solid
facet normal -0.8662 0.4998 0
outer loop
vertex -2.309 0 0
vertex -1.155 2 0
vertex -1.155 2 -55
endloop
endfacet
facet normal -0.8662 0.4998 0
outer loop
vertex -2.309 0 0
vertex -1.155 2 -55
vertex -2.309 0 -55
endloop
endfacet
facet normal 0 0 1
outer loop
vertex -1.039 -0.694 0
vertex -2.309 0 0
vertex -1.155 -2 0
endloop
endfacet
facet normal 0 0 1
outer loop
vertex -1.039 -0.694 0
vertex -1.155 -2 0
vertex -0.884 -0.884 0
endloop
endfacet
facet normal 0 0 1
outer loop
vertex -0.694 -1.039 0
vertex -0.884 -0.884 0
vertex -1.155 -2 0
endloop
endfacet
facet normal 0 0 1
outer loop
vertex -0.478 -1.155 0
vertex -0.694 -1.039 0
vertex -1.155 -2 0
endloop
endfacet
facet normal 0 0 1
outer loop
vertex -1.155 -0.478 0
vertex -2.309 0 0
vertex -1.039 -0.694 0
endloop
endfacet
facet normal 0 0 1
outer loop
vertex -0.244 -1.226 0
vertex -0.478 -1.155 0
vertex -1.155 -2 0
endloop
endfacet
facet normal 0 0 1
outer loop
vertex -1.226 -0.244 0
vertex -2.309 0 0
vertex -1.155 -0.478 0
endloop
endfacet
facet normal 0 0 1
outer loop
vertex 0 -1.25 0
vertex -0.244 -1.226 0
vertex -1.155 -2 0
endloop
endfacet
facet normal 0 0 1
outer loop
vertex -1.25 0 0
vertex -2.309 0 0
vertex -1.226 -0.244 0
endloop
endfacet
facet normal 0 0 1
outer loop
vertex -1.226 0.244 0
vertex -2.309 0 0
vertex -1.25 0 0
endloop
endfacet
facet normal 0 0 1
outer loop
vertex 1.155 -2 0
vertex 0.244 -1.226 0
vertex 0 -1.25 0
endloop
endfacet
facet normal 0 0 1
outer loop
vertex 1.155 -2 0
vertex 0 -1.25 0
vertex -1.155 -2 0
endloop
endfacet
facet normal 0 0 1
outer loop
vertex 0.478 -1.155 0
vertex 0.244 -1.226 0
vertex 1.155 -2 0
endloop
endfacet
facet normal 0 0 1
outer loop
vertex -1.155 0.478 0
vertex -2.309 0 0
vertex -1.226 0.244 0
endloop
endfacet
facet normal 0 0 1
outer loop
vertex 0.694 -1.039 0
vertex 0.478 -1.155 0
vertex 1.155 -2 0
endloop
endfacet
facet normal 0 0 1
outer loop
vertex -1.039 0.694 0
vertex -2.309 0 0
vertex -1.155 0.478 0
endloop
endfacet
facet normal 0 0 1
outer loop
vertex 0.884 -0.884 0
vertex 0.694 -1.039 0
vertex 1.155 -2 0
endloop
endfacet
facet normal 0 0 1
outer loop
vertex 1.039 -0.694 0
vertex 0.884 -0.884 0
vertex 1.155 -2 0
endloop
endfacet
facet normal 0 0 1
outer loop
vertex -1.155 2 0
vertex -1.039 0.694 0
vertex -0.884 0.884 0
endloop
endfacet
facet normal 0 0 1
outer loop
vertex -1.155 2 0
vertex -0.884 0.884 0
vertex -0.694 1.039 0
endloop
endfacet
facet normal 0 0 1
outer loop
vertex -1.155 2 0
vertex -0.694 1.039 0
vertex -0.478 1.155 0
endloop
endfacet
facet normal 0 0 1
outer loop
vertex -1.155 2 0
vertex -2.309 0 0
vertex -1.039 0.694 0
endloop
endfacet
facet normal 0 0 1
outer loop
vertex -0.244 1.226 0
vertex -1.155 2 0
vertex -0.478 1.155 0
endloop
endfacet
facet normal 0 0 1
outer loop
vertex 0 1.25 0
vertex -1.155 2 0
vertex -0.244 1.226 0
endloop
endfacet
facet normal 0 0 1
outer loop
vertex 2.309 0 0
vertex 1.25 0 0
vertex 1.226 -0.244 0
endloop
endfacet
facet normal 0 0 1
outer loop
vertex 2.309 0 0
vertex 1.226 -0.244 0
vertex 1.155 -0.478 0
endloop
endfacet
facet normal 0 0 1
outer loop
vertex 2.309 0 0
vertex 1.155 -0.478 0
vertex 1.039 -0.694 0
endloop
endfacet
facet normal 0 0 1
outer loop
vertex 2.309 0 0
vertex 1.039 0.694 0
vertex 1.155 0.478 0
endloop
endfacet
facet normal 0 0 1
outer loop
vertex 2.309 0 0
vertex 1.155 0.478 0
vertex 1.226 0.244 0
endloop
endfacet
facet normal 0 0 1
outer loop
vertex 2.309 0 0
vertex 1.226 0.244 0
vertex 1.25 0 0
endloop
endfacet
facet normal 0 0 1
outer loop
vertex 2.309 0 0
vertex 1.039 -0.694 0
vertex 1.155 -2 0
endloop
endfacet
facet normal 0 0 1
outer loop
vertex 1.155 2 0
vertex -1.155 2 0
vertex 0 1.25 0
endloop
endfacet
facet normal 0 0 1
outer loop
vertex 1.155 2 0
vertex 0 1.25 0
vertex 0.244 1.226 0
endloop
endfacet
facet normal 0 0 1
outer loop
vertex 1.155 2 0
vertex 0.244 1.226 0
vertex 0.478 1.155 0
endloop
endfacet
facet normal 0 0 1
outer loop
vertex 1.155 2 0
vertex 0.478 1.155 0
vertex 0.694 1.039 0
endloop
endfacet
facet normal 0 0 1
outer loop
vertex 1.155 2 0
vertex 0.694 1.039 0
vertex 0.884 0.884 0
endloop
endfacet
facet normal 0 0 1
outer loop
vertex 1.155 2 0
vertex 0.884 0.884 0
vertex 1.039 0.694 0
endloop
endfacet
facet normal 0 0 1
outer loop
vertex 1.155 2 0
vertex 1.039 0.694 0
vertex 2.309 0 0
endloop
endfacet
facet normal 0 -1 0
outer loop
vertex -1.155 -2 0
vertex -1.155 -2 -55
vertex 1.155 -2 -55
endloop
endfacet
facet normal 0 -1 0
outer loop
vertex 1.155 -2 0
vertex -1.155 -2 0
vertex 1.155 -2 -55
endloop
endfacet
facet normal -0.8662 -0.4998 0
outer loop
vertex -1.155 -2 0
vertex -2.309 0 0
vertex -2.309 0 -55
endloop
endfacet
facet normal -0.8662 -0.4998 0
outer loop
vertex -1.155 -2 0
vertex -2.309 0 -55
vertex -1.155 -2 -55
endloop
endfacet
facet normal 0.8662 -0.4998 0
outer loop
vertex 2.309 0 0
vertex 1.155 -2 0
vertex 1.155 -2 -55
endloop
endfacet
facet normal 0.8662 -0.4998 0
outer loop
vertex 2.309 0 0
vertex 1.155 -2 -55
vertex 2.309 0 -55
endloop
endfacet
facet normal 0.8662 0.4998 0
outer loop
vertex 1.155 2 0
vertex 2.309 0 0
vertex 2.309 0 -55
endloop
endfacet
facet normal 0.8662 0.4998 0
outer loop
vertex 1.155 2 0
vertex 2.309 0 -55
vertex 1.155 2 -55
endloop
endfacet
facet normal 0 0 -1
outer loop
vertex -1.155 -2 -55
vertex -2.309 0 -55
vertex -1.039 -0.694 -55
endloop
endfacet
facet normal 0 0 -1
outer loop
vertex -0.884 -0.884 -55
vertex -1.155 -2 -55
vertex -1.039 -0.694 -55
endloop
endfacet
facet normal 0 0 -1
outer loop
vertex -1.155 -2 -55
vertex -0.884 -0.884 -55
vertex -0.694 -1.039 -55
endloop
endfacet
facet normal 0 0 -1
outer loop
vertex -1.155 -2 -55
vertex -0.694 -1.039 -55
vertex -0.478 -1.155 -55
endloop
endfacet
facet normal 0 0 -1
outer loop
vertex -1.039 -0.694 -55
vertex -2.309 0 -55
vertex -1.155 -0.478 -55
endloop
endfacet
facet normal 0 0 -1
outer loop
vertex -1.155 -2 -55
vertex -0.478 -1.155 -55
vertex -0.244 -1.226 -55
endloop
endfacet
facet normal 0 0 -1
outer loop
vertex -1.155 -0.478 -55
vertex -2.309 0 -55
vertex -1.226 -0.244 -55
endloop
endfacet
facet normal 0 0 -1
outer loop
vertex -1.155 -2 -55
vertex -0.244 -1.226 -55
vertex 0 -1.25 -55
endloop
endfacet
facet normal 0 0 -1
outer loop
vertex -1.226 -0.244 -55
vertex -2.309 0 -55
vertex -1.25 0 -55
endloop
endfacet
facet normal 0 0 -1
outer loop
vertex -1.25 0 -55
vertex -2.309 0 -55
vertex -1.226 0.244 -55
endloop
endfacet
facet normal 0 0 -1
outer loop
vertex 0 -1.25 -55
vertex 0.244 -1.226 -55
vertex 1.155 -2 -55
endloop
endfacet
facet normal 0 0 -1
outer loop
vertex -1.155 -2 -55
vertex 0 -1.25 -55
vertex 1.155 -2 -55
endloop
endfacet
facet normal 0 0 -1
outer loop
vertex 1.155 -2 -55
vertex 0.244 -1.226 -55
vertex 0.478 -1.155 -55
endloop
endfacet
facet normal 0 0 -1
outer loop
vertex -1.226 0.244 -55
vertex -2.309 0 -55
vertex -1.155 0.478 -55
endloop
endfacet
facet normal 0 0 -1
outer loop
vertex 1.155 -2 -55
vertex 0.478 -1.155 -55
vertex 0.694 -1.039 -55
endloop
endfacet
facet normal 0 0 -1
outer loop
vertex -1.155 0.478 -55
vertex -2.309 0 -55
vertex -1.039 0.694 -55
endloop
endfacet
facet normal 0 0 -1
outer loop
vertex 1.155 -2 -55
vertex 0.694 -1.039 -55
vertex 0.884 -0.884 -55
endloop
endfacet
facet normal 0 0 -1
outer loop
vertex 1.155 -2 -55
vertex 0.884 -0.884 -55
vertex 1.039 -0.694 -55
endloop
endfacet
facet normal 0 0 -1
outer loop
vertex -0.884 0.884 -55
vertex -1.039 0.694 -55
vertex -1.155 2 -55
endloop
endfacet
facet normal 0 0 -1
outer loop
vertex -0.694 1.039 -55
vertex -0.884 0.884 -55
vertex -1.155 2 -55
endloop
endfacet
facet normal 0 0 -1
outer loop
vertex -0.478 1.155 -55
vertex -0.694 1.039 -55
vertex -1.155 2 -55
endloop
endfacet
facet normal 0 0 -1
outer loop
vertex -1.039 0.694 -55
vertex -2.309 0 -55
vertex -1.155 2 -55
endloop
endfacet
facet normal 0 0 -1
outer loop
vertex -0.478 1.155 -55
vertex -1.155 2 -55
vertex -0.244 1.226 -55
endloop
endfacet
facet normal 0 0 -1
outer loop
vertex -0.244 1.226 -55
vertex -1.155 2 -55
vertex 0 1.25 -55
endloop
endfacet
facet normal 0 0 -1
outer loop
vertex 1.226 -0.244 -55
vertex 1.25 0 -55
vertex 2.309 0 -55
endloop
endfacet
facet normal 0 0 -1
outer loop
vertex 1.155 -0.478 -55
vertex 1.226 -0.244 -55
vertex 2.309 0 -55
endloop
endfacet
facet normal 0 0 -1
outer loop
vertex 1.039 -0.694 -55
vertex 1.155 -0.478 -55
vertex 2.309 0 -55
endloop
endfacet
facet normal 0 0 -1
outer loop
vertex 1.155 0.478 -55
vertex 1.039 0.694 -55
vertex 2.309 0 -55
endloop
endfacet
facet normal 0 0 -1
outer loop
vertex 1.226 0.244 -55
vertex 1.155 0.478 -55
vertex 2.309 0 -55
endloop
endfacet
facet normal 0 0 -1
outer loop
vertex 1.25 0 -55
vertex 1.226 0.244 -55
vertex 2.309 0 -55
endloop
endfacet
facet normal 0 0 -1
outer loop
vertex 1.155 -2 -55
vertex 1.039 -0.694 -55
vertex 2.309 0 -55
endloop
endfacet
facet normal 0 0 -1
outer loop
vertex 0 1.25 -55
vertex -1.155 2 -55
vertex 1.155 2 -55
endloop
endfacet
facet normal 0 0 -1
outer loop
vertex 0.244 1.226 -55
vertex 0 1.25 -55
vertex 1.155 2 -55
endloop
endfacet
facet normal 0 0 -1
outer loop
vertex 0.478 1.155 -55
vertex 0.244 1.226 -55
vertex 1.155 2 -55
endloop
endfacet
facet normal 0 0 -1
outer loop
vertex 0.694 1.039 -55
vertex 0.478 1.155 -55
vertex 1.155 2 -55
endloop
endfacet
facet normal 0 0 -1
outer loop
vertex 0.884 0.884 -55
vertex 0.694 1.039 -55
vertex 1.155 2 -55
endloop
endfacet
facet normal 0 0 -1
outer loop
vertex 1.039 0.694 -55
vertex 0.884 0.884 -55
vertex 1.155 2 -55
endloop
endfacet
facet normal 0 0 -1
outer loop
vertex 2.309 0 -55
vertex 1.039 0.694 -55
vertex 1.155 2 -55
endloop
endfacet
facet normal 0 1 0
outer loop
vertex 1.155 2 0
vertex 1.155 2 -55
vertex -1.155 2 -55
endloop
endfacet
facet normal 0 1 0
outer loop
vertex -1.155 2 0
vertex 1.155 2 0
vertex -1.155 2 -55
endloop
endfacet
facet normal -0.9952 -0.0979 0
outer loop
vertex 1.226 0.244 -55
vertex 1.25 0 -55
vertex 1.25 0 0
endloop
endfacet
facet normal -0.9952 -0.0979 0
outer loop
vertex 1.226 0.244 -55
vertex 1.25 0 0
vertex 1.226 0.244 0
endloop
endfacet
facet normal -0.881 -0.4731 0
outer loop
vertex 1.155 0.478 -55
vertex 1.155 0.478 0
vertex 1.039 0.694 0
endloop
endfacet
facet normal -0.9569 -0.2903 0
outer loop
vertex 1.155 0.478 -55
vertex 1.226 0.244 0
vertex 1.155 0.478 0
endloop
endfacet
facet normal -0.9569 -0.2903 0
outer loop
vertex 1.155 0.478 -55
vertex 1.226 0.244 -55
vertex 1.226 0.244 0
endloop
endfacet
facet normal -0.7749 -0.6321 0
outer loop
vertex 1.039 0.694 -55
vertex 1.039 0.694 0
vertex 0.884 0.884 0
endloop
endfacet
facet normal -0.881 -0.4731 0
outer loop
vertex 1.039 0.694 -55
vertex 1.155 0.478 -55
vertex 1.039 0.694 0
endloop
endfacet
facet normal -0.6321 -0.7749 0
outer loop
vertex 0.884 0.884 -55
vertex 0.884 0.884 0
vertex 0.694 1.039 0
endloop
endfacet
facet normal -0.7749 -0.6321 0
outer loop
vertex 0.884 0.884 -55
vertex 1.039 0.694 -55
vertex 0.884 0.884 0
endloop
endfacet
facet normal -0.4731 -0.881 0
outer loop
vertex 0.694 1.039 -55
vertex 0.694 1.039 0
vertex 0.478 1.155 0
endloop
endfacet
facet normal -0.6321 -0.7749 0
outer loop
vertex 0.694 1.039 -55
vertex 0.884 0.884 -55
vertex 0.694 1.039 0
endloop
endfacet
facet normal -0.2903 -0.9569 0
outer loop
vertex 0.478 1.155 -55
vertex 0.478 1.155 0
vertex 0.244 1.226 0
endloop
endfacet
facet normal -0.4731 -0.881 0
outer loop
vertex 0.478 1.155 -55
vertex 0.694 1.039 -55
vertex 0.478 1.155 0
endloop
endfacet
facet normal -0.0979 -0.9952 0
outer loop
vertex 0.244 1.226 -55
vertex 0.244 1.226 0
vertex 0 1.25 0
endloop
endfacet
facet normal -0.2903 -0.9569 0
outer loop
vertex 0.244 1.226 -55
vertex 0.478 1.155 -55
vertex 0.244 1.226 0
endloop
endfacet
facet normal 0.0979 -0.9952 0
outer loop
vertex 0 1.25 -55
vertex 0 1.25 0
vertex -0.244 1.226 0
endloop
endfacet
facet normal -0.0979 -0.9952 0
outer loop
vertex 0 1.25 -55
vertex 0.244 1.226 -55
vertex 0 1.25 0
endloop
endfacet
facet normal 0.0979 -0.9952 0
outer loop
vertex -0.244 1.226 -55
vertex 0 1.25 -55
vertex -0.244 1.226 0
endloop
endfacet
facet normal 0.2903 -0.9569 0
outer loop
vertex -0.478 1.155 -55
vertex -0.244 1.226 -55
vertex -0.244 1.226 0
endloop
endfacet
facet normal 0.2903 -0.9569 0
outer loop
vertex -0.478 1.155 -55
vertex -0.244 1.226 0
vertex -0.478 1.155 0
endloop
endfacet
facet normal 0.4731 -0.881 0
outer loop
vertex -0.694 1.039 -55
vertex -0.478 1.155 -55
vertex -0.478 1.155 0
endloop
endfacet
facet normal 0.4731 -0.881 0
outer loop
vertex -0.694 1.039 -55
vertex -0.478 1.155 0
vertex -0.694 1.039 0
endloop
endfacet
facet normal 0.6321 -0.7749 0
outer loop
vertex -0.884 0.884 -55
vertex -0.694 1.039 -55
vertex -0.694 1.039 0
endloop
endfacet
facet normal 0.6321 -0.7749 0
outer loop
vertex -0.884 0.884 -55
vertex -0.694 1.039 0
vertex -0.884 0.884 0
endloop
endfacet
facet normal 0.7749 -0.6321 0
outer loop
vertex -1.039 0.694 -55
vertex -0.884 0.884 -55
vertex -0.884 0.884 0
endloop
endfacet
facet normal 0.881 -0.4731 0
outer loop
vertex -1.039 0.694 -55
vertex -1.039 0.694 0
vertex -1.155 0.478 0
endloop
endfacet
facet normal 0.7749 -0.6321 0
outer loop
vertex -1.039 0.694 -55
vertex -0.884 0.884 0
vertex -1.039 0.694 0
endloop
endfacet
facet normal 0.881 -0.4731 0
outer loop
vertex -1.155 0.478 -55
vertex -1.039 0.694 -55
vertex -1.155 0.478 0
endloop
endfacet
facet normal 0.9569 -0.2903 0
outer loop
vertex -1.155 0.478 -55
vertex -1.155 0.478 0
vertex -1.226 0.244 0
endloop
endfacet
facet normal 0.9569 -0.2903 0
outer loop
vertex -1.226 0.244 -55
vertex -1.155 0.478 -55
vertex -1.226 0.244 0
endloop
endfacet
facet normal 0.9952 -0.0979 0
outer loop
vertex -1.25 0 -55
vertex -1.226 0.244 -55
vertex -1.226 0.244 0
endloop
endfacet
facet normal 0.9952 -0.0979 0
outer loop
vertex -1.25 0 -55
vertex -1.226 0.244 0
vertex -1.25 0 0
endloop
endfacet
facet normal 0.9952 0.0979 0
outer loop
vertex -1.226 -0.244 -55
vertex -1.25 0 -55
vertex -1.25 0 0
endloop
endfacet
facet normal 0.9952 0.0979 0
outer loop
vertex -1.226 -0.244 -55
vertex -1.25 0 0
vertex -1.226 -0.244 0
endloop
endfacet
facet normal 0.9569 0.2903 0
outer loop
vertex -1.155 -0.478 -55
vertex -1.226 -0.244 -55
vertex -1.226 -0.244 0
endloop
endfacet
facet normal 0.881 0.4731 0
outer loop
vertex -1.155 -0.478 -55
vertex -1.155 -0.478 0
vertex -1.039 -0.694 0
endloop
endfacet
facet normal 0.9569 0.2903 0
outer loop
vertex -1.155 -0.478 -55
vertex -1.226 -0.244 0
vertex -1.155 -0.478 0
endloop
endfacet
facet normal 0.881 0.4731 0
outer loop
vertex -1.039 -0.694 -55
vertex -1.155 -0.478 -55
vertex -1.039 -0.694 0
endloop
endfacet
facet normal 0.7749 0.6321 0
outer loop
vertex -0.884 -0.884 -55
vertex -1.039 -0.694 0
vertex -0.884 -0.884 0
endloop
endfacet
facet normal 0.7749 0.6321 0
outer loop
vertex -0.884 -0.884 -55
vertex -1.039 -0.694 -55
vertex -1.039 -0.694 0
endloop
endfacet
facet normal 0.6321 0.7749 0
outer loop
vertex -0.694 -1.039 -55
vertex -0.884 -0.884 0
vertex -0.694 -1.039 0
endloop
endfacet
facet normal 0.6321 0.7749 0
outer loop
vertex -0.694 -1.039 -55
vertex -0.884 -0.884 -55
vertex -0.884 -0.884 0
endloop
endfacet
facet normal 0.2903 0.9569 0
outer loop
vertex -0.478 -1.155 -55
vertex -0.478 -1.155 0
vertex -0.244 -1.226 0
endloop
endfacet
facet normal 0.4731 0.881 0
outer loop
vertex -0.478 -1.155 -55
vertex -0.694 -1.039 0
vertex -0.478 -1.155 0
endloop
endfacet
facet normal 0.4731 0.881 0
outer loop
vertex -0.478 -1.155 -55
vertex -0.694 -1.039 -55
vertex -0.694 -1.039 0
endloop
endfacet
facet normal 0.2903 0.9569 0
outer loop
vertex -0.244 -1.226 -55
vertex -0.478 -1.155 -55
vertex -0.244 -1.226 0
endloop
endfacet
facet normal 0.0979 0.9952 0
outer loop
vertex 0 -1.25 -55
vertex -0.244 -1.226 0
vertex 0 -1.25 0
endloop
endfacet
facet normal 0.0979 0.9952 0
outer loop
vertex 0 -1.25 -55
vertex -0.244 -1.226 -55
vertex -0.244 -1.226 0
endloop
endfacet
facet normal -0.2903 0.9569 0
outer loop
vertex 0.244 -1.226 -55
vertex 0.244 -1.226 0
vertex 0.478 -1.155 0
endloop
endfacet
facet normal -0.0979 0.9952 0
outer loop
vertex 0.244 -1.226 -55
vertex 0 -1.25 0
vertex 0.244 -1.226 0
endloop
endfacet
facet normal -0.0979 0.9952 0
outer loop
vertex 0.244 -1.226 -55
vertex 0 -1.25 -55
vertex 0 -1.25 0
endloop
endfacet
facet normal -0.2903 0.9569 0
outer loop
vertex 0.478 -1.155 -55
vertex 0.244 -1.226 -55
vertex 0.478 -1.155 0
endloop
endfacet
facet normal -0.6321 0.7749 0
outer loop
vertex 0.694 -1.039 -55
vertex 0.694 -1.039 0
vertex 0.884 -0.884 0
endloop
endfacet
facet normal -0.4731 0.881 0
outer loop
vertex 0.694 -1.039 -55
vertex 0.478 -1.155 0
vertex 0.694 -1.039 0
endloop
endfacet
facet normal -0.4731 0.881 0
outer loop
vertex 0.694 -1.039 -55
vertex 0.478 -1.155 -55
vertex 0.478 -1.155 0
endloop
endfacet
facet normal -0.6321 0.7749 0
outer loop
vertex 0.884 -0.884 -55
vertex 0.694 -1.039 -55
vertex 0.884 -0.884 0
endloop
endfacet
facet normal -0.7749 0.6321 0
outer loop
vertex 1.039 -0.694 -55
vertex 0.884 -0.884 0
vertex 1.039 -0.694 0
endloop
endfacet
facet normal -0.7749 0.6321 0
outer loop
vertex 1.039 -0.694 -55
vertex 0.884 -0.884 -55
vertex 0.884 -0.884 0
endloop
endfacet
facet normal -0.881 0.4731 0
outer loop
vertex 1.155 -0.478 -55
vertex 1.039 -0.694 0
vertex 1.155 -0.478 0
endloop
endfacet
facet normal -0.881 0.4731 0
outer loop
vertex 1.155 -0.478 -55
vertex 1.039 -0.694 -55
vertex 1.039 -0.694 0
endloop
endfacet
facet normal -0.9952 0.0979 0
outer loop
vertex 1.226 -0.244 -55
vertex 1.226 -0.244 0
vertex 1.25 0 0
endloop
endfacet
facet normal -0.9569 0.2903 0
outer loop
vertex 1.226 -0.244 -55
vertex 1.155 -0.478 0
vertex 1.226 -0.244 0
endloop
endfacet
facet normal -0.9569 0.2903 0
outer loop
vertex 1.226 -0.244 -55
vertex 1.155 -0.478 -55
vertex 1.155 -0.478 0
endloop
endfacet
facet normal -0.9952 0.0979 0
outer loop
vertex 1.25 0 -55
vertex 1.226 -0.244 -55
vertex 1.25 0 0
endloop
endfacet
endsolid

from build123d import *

# Parameters (mm, degrees)
BOSS_EXTRUDE1_DEPTH     = 55
CUT_EXTRUDE1_DEPTH      = 56.084783138
CUT_EXTRUDE1_DEPTH_BACK = 56.084783138
SKETCH2_R               = 1.25


with BuildPart() as part:
    # Sketch1 → Boss-Extrude1 (new body)
    with BuildSketch(Plane.XY):
        Polygon((2.309401077, 0), (1.154700538, 2), (-1.154700538, 2), (-2.309401077, 0), (-1.154700538, -2), (1.154700538, -2), align=None)
    extrude(amount=-BOSS_EXTRUDE1_DEPTH)

    # Sketch2 → Cut-Extrude1 (cut, two sides: drawn at the far end of the back side and taken through both)
    with BuildSketch(Plane.XY.offset(-CUT_EXTRUDE1_DEPTH_BACK)):
        Circle(SKETCH2_R)
    extrude(amount=CUT_EXTRUDE1_DEPTH + CUT_EXTRUDE1_DEPTH_BACK, mode=Mode.SUBTRACT)


solid = part.part
